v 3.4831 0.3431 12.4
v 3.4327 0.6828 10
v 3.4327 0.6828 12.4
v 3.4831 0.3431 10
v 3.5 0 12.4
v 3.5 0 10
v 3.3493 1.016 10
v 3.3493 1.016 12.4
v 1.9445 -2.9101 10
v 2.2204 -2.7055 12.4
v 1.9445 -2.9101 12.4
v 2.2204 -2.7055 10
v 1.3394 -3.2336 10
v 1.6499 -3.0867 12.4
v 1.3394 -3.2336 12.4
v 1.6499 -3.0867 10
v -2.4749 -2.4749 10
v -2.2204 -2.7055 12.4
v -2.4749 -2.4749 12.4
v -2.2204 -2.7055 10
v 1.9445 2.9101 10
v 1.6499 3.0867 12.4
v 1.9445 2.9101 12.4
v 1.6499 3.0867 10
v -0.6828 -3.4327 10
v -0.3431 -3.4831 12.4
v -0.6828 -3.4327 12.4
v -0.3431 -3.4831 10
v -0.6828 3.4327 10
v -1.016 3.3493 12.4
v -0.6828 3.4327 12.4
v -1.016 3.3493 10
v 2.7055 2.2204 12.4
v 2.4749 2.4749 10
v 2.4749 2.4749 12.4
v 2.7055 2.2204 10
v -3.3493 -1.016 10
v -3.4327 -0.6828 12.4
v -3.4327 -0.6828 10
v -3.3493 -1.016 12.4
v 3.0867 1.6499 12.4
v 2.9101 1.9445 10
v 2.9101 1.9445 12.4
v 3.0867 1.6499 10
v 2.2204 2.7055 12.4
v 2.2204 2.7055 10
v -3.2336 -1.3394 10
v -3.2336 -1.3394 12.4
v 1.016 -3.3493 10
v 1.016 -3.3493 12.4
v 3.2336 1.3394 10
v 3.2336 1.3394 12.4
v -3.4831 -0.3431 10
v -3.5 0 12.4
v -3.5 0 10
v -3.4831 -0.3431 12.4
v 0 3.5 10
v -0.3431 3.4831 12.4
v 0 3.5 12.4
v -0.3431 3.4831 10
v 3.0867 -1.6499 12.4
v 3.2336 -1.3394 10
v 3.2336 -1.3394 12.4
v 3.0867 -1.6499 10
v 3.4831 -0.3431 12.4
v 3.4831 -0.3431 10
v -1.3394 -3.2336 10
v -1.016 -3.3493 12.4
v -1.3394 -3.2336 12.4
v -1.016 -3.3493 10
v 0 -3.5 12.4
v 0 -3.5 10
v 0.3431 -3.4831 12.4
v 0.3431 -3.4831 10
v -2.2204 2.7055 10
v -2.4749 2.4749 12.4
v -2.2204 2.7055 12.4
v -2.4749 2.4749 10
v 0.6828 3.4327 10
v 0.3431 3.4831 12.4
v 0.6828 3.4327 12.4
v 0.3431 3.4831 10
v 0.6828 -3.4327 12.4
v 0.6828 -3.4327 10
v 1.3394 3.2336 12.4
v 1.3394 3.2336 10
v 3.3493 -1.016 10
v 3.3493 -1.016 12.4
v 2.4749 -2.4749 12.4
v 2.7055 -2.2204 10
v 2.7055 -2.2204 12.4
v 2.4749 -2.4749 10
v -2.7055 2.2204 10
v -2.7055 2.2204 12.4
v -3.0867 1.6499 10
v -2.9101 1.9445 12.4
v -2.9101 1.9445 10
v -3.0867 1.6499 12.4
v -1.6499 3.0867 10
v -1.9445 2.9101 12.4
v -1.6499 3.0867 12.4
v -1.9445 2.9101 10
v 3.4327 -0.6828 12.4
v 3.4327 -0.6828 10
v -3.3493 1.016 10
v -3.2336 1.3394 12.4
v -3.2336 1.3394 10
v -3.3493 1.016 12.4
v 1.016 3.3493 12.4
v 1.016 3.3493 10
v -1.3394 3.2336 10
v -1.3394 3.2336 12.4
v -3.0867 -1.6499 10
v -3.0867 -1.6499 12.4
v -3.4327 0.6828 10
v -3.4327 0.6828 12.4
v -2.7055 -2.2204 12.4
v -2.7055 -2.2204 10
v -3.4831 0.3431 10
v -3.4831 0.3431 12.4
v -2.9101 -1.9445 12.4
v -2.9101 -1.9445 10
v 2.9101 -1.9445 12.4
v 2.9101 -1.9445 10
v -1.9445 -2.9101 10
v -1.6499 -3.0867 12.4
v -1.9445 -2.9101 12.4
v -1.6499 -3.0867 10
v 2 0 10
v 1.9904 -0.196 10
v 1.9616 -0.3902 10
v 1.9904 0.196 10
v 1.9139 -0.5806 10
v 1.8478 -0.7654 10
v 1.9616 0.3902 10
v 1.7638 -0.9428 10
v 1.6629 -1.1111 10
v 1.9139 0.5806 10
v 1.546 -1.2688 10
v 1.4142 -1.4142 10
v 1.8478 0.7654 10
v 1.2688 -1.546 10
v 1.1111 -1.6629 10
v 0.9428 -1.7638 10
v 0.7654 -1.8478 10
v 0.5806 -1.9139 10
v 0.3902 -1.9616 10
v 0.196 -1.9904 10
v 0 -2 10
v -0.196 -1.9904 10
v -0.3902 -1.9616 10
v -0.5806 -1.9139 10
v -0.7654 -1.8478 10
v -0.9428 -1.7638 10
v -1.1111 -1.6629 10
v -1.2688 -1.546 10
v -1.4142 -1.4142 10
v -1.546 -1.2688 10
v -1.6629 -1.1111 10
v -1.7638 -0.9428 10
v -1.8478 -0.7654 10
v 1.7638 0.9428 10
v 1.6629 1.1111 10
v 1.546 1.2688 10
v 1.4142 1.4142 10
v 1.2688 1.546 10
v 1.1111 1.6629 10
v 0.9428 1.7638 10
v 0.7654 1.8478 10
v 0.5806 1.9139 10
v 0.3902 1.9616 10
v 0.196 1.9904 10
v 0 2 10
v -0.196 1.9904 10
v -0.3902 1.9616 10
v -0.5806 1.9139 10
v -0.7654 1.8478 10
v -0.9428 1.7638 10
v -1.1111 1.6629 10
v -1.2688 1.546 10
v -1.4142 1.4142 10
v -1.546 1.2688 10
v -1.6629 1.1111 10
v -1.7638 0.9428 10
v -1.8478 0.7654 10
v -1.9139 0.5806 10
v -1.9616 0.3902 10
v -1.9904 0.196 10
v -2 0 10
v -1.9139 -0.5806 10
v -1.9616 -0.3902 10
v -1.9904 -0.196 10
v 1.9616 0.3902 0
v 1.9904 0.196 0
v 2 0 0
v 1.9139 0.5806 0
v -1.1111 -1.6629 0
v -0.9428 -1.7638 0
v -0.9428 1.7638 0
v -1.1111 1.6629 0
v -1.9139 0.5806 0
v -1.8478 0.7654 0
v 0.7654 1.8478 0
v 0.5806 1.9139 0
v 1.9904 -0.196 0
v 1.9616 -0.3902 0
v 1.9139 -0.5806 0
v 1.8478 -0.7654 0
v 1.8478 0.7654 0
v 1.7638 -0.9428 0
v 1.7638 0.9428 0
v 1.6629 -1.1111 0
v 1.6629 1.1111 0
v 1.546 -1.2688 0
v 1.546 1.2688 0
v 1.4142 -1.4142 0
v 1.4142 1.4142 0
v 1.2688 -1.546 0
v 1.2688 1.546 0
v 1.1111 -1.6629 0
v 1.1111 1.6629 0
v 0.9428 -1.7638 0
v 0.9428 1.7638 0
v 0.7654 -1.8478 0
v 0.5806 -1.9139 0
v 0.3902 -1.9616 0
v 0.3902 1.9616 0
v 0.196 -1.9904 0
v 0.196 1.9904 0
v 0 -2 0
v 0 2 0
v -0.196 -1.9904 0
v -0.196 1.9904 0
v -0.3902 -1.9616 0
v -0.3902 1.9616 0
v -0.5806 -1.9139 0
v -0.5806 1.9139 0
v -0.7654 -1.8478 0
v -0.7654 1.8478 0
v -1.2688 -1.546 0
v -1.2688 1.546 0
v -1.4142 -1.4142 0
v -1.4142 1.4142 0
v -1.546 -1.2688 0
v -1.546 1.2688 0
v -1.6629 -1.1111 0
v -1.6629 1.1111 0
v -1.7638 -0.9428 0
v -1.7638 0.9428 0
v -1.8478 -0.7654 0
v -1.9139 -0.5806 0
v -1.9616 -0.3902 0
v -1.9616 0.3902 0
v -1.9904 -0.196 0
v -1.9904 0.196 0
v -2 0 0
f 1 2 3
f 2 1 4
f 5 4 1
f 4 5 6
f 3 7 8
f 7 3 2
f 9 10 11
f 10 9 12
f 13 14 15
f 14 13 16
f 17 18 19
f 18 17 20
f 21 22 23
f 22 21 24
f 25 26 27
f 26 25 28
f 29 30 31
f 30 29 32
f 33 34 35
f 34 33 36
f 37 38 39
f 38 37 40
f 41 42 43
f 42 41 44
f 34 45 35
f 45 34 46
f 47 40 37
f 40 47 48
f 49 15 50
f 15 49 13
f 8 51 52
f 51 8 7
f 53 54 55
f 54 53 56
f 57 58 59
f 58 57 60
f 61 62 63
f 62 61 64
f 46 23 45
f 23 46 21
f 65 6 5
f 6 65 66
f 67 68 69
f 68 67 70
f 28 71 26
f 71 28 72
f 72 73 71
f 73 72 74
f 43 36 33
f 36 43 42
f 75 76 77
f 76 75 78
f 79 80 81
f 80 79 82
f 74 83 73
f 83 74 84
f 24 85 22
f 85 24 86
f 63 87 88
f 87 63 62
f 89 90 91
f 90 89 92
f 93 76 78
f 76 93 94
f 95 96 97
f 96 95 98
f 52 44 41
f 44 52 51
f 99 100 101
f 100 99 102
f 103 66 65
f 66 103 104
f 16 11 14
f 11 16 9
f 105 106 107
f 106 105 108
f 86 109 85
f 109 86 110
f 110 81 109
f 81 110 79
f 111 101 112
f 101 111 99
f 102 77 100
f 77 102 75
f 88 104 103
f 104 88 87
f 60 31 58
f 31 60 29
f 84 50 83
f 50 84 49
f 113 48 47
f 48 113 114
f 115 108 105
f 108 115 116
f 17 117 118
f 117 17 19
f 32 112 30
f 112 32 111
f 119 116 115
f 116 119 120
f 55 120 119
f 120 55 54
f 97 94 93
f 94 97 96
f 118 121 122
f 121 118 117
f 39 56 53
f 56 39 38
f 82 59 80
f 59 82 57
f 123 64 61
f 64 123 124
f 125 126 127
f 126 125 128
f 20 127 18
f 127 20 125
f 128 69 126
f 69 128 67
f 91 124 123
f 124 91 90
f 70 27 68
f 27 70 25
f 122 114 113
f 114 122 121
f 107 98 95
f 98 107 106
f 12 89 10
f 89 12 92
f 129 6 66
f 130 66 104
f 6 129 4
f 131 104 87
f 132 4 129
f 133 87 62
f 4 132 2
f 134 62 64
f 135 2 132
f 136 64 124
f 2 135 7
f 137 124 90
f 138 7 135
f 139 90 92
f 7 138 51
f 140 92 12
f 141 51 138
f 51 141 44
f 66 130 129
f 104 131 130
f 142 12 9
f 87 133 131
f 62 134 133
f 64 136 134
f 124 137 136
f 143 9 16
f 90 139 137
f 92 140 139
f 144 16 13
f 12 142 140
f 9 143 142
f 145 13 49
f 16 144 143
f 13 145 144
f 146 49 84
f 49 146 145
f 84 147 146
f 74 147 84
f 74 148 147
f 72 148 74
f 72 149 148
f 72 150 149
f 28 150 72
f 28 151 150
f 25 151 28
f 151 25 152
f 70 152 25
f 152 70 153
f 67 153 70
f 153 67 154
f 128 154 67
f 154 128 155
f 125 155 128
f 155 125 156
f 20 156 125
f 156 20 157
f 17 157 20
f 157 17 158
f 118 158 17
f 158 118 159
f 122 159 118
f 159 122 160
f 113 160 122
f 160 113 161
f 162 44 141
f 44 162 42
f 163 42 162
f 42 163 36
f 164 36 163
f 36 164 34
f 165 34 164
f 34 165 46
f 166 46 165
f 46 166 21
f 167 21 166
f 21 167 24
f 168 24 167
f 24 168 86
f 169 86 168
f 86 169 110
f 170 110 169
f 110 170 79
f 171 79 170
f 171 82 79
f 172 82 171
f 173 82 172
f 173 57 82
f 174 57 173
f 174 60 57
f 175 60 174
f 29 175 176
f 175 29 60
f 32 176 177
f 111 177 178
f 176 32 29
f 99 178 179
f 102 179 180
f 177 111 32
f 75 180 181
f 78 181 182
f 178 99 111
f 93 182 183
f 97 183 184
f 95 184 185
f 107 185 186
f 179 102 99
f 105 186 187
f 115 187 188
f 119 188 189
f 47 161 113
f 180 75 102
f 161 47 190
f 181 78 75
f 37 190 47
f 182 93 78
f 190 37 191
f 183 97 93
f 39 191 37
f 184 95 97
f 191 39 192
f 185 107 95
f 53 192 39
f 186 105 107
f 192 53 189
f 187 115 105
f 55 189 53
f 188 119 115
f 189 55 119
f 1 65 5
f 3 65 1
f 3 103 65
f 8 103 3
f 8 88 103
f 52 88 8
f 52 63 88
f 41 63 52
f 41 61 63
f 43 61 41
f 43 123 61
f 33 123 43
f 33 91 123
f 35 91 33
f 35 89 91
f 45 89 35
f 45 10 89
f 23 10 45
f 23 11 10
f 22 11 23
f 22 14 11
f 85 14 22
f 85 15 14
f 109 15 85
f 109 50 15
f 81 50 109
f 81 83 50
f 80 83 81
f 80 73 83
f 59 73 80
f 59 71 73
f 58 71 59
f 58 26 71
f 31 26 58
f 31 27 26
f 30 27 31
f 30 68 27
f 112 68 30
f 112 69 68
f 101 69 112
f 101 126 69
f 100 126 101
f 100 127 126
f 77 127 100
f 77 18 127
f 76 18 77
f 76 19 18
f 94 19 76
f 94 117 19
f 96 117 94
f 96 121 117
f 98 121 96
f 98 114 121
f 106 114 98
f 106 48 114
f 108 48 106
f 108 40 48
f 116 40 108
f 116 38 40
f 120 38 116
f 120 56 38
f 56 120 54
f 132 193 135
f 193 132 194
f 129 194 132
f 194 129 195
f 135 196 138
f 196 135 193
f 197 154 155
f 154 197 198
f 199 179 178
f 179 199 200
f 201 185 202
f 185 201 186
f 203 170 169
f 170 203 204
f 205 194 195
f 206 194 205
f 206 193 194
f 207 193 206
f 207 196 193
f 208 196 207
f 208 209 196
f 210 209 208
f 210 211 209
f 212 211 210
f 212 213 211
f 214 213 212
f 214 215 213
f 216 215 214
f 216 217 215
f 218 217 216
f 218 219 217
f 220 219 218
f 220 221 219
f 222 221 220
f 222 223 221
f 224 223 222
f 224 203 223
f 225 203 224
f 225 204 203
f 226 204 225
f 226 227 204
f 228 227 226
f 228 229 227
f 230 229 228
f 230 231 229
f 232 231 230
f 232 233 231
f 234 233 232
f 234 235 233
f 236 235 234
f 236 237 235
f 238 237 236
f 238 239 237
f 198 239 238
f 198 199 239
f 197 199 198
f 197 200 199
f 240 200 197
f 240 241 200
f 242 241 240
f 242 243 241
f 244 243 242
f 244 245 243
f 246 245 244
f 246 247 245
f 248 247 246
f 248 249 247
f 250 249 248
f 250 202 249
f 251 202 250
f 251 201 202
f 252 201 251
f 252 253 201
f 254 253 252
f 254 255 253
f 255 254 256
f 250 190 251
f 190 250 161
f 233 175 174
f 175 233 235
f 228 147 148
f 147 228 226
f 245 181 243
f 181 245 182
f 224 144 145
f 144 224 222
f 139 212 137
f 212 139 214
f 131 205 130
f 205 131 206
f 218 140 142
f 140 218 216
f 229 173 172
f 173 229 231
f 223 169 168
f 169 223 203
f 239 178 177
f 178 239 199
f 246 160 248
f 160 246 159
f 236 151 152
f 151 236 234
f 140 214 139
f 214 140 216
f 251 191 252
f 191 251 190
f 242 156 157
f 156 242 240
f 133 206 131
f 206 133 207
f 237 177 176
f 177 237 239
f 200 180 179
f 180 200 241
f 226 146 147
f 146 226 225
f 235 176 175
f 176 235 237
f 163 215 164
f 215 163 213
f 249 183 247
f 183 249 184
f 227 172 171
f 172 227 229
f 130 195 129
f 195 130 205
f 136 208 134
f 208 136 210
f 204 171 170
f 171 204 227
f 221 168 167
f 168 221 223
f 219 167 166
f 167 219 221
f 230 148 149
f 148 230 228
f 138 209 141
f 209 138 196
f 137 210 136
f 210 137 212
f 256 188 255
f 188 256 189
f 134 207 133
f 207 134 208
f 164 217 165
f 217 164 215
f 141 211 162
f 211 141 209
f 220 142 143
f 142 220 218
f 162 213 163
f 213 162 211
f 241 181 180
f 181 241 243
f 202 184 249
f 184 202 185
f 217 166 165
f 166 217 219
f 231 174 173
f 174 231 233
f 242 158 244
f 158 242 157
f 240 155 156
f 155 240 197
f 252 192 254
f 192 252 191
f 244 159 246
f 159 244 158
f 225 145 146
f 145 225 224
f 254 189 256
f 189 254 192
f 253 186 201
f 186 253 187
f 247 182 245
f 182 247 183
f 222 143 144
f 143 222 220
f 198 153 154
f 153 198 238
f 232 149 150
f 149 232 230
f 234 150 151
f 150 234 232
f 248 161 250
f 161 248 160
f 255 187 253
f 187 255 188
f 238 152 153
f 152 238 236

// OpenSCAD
module screw() {
    union() {
        // Screw head
        translate([0, 0, 10])
            cylinder(h = 2.4, d = 7.0, $fn = 64);
        
        // Screw body
        cylinder(h = 10, d = 4.0, $fn = 64);
    }
}

screw();
